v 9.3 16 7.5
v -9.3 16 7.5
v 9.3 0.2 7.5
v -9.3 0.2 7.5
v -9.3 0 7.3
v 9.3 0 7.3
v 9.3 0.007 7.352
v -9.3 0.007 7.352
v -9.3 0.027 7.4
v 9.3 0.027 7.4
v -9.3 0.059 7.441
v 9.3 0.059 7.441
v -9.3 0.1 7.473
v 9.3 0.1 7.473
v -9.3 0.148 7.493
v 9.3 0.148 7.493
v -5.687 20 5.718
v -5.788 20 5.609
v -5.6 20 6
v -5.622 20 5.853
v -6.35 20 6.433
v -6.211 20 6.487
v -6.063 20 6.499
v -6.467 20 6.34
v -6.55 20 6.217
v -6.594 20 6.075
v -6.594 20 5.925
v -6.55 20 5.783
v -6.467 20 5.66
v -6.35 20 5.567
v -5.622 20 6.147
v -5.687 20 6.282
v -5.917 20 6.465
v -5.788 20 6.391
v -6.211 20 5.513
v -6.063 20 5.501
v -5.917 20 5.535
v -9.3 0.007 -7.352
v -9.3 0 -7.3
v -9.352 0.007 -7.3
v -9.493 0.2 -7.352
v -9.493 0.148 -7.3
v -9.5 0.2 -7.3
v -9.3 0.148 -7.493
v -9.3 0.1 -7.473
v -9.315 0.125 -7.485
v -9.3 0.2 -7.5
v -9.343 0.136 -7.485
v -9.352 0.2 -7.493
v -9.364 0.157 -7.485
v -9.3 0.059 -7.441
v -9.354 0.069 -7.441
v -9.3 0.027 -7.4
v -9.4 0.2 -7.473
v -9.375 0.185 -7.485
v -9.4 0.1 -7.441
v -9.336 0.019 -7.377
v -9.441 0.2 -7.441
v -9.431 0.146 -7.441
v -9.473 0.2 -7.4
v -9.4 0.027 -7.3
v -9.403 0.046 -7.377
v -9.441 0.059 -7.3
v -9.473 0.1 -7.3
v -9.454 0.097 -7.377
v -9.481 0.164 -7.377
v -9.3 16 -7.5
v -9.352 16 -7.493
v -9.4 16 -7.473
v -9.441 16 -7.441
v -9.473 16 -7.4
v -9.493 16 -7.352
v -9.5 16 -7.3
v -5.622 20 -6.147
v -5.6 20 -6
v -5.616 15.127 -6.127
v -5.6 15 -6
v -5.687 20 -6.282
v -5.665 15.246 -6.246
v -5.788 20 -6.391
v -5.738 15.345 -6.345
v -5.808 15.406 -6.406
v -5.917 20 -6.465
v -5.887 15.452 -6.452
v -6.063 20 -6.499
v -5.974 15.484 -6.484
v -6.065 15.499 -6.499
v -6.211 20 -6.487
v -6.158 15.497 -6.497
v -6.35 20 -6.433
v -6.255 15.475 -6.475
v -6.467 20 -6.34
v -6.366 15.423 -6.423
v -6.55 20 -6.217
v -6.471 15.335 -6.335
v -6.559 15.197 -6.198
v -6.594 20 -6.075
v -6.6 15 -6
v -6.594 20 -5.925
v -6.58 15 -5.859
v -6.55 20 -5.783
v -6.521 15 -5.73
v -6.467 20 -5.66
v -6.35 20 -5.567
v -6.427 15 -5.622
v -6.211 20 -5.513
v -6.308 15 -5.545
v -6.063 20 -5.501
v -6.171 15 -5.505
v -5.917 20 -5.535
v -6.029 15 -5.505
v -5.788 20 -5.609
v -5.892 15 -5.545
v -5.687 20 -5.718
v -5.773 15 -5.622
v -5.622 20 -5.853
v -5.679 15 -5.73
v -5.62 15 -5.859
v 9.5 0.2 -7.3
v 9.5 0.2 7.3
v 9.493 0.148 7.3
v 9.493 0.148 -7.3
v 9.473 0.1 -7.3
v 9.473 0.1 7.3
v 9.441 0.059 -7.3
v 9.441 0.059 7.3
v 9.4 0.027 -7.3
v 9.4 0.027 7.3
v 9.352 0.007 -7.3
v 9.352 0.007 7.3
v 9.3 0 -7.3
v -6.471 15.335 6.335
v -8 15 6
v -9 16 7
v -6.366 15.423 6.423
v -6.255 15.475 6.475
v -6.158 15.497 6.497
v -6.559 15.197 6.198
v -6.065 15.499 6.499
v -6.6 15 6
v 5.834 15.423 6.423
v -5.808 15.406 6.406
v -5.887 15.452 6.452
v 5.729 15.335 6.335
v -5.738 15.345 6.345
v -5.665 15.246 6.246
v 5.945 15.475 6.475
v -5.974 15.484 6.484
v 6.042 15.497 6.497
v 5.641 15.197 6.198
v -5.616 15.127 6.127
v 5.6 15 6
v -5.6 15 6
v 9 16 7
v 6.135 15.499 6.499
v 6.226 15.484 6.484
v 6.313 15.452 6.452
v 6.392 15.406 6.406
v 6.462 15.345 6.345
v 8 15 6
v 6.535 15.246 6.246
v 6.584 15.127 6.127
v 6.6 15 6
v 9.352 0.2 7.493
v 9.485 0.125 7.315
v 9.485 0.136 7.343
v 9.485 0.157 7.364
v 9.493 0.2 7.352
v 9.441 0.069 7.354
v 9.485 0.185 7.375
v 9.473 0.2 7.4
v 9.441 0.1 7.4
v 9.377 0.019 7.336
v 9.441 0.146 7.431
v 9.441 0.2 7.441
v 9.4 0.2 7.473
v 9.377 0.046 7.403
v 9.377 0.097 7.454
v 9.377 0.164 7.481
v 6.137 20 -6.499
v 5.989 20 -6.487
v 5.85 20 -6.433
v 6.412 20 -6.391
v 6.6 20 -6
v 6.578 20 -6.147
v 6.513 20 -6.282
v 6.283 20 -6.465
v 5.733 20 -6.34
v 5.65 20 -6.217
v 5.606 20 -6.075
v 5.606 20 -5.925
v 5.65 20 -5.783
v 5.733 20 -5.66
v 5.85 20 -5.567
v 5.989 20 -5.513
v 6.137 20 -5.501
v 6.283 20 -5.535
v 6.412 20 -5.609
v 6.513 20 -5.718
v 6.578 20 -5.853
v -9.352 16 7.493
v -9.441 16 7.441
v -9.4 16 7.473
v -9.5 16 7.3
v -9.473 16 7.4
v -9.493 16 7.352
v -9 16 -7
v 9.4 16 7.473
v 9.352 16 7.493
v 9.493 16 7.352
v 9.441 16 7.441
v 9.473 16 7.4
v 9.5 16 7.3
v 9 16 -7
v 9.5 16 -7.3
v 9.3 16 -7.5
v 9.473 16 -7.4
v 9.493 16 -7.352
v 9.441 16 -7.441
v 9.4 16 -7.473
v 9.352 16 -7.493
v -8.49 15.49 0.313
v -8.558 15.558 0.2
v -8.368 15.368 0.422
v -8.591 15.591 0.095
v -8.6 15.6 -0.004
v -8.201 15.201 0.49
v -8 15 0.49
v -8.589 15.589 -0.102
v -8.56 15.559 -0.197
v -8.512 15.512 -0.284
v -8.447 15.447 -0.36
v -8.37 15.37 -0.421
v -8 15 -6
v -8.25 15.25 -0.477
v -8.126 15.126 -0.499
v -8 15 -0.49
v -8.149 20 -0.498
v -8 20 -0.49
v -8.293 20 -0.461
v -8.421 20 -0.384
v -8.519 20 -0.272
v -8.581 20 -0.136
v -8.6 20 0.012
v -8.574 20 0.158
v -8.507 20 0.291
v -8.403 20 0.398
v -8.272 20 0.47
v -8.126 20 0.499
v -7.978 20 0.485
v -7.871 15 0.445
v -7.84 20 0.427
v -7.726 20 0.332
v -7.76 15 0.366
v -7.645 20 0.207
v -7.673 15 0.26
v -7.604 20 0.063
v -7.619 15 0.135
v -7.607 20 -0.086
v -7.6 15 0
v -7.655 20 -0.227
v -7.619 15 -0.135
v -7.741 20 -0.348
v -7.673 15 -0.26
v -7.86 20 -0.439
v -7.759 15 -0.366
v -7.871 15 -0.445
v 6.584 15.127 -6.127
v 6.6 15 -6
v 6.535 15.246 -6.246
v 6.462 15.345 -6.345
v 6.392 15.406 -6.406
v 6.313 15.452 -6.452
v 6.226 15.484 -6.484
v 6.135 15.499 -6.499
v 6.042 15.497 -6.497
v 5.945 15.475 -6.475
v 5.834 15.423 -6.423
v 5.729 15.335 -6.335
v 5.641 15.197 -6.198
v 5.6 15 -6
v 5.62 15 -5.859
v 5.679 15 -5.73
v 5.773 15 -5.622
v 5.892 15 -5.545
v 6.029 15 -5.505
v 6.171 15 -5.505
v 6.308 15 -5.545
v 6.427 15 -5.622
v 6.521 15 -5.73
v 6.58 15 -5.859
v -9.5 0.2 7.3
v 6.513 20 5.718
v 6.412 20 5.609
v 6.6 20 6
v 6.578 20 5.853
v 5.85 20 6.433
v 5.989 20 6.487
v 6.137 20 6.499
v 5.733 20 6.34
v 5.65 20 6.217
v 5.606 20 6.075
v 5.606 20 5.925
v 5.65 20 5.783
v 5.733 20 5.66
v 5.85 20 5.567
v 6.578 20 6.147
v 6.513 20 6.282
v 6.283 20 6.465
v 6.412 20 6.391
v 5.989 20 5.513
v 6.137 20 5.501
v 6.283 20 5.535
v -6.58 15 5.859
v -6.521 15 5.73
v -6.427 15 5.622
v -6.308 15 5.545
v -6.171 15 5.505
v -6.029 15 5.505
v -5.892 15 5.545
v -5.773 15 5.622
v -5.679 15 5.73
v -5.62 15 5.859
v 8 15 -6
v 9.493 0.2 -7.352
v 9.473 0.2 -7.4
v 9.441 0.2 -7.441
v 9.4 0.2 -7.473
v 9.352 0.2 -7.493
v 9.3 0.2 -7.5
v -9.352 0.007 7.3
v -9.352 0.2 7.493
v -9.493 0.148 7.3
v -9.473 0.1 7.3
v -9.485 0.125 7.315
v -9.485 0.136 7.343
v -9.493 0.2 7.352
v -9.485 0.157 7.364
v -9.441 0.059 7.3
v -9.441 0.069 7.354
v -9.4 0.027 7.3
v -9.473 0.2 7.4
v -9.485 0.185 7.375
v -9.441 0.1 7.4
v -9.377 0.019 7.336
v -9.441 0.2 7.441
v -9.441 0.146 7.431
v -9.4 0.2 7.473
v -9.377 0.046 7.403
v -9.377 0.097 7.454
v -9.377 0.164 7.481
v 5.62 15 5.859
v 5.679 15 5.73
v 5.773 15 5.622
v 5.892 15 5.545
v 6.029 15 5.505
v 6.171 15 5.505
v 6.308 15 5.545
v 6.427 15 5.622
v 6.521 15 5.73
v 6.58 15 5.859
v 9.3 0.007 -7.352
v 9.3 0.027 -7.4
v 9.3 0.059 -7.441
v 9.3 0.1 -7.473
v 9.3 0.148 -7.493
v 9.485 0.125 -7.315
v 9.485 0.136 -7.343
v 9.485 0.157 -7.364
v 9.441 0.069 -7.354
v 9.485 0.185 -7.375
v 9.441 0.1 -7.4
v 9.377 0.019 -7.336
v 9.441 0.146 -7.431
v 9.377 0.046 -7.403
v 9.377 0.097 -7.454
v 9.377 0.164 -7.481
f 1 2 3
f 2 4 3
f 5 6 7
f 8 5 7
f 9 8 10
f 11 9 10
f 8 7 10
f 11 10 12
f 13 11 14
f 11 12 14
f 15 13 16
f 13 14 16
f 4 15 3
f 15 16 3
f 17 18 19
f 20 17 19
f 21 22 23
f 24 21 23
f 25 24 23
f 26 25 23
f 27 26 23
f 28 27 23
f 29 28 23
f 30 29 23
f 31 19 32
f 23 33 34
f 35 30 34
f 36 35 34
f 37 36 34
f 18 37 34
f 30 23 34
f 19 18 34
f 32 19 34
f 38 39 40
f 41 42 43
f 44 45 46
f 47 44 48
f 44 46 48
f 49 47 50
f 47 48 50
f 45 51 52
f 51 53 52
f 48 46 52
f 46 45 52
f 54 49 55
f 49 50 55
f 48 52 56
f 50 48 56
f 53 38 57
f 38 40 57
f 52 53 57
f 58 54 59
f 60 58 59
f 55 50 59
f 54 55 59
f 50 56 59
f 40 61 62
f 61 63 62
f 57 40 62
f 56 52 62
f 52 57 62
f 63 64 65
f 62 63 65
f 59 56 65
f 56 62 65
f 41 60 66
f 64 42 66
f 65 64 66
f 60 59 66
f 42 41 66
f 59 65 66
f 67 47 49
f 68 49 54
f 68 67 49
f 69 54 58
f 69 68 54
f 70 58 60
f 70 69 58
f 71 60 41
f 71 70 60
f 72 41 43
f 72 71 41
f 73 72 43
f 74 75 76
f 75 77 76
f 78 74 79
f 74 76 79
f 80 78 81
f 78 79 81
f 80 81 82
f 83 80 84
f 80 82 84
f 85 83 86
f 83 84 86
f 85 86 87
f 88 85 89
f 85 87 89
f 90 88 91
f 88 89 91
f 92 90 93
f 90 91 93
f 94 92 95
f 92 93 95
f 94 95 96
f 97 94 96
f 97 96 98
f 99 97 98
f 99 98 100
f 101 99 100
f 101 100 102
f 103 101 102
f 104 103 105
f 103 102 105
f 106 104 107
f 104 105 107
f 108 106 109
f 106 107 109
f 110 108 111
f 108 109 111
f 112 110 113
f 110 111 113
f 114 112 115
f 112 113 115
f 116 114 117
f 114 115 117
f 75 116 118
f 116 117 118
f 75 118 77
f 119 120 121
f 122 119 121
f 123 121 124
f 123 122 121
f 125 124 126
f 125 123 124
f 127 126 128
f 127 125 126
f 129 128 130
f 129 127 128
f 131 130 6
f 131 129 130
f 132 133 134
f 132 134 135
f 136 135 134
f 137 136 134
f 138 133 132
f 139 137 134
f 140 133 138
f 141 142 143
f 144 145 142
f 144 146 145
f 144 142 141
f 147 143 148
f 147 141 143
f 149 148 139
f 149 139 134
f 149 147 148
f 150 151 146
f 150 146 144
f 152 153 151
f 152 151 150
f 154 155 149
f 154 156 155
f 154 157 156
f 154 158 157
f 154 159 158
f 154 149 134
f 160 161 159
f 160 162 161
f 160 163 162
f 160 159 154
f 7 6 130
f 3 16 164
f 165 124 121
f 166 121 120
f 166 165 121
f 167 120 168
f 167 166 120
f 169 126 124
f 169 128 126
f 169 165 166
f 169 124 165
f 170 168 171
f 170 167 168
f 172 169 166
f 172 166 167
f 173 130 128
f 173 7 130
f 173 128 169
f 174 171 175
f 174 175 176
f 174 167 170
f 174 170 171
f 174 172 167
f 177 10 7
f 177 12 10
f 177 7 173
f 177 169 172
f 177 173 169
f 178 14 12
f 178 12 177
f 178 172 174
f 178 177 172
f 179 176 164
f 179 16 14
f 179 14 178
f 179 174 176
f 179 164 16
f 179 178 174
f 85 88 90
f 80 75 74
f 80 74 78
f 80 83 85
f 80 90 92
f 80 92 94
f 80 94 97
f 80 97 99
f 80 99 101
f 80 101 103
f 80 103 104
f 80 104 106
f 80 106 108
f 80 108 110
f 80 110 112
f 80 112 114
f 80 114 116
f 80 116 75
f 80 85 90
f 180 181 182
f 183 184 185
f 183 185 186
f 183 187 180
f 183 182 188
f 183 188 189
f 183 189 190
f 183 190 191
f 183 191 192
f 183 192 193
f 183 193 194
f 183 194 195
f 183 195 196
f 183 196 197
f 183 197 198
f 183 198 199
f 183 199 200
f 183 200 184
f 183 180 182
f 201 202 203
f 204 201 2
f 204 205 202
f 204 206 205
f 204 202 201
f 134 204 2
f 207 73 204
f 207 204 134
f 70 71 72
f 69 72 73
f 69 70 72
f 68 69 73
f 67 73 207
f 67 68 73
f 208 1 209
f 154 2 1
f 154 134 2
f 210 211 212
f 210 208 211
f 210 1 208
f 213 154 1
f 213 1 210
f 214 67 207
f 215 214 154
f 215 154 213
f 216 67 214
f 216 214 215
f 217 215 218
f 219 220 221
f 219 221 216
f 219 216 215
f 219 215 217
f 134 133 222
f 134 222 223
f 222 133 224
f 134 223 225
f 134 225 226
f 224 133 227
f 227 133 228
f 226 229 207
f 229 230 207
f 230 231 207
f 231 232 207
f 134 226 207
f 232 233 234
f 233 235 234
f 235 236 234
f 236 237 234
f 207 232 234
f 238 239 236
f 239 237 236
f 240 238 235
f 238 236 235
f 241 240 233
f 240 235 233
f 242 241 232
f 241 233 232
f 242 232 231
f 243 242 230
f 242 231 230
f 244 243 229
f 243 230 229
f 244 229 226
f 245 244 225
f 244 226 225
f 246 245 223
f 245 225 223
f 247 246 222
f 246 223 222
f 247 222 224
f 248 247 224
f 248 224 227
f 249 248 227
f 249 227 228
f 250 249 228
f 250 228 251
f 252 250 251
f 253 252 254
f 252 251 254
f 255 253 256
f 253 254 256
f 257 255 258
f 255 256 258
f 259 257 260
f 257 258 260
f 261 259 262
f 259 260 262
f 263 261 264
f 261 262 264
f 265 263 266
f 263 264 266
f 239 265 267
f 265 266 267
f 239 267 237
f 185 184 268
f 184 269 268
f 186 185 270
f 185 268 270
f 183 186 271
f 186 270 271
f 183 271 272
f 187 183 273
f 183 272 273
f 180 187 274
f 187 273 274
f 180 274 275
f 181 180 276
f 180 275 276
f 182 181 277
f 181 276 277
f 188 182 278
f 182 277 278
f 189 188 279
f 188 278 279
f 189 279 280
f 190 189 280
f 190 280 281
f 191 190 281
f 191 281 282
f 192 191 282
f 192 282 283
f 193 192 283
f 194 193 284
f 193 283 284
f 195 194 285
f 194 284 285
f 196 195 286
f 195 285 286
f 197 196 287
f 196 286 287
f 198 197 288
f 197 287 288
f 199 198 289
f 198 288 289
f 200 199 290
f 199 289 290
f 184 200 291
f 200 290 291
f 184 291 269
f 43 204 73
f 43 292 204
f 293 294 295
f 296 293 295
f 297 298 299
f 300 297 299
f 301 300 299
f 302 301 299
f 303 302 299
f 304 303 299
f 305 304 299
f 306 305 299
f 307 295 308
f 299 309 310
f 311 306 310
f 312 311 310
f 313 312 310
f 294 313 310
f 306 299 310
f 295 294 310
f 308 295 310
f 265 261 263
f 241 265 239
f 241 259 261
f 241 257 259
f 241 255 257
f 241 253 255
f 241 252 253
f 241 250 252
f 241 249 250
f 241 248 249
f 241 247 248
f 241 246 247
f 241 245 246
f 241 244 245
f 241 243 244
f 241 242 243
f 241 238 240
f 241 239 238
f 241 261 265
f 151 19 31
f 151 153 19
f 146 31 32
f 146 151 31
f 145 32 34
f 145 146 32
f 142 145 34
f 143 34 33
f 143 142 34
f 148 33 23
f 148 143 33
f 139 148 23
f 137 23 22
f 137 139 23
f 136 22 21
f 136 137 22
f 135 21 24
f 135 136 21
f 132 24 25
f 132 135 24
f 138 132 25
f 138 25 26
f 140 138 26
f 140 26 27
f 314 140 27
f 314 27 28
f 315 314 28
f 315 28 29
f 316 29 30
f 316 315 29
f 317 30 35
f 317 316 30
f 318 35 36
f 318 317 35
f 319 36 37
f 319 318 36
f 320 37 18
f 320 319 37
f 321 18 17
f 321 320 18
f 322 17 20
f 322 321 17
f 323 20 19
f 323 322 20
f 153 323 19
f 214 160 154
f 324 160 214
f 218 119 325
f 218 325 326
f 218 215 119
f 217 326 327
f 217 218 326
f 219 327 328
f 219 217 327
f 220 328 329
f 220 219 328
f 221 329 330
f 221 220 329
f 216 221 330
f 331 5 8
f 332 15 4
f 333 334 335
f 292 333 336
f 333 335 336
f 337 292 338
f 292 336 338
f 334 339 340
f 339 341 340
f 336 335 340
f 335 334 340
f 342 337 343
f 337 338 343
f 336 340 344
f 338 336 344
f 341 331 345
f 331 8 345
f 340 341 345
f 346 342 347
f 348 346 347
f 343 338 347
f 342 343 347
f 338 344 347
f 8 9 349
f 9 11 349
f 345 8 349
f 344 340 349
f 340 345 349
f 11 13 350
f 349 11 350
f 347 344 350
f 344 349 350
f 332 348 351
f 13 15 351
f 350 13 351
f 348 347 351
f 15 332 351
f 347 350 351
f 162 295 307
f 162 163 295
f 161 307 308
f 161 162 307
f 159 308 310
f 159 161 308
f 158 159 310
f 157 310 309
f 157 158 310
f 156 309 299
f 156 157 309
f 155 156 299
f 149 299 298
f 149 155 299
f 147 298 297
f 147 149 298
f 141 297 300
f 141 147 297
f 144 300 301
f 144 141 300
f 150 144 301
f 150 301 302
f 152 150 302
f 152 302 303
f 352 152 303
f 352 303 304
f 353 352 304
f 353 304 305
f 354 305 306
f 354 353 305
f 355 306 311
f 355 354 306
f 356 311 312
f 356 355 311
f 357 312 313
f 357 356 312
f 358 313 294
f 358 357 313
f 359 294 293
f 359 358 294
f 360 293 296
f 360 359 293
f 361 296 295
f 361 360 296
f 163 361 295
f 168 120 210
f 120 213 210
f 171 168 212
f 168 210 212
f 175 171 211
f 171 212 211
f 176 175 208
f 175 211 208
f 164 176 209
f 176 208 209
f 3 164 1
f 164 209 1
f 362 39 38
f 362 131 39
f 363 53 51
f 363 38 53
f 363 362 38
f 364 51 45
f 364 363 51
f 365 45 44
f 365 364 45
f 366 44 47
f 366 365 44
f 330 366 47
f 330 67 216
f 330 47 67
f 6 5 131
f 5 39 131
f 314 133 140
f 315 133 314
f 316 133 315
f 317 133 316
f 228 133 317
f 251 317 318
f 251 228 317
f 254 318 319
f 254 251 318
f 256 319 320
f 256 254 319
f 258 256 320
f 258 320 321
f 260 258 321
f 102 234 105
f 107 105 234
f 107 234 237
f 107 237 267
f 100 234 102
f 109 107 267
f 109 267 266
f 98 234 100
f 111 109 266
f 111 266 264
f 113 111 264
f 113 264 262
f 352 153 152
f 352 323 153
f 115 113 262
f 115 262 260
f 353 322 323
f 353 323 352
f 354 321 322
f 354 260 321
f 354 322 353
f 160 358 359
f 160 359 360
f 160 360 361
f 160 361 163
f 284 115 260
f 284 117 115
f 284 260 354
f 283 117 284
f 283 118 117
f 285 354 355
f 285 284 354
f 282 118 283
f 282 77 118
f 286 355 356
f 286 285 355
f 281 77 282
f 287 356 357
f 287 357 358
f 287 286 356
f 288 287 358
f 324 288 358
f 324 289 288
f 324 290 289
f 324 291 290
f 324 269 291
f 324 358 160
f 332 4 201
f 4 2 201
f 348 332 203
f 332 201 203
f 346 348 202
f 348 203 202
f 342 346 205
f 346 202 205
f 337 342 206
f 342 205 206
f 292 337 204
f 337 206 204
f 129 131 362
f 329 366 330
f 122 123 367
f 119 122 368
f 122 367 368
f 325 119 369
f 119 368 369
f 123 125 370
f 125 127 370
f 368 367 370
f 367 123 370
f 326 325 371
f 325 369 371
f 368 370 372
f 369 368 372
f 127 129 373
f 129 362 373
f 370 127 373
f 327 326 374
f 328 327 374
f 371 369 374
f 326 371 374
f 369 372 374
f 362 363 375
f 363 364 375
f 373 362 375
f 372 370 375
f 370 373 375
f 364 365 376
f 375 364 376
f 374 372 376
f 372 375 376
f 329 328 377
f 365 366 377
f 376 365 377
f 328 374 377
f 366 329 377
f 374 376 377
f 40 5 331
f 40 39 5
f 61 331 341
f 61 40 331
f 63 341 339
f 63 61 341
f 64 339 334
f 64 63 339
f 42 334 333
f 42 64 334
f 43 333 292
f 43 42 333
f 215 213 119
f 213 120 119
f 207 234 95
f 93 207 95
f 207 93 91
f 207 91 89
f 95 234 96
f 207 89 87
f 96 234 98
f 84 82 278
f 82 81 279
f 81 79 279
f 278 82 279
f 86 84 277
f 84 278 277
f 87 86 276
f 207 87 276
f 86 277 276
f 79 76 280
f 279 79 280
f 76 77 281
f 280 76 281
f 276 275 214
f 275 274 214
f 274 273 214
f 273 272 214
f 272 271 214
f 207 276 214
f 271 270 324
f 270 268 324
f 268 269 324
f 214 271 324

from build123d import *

# Parameters (mm, degrees)
SKETCH2_W           = 19
SKETCH2_H           = 15
BOSS_EXTRUDE1_DEPTH = 16
SKETCH3_W           = 18
SKETCH3_H           = 14
CUT_EXTRUDE1_DEPTH  = 1
CHAMFER1_SIZE       = 1
SKETCH4_R           = 0.5
BOSS_EXTRUDE3_DEPTH = 5
FILLET1_R           = 0.2


with BuildPart() as part:
    # Sketch2 → Boss-Extrude1 (new body)
    with BuildSketch(Plane(origin=(0, 0, 0), x_dir=(1, 0, 0), z_dir=(0, 1, 0))):
        Rectangle(SKETCH2_W, SKETCH2_H)
    extrude(amount=BOSS_EXTRUDE1_DEPTH)

    # Sketch3 → Cut-Extrude1 (cut)
    with BuildSketch(Plane(origin=(0, 16, 0), x_dir=(1, 0, 0), z_dir=(0, 1, 0))):
        Rectangle(SKETCH3_W, SKETCH3_H)
    extrude(amount=-CUT_EXTRUDE1_DEPTH, mode=Mode.SUBTRACT)

    # Chamfer1
    chamfer1_edges = [part.edges().sort_by_distance(p)[0] for p in [
        (0, 15, 7),
        (9, 15, 0),
        (0, 15, -7),
        (-9, 15, 0),
    ]]
    chamfer(chamfer1_edges, length=CHAMFER1_SIZE - 0.0001)  # a hair under: the kernel refuses the full size

    # Sketch4 → Boss-Extrude3 (add)
    with BuildSketch(Plane(origin=(0, 15, 0), x_dir=(1, 0, 0), z_dir=(0, 1, 0))):
        with Locations(Location((-8.1, 0, 0), (0, 0, 78.463040967))):
            Circle(SKETCH4_R)
        with Locations((-6.1, 6)):
            Circle(SKETCH4_R)
        with Locations((6.1, 6)):
            Circle(SKETCH4_R)
    boss_extrude3 = extrude(amount=BOSS_EXTRUDE3_DEPTH)

    # Mirror1: Boss-Extrude3 across plane
    add(boss_extrude3.mirror(Plane.XY))

    # Fillet1
    fillet1_edges = [part.edges().sort_by_distance(p)[0] for p in [
        (0, 0, 7.5),
        (-9.5, 0, 0),
        (0, 0, -7.5),
        (9.5, 0, 0),
        (9.5, 8, 7.5),
        (-9.5, 8, 7.5),
        (-9.5, 8, -7.5),
        (9.5, 8, -7.5),
    ]]
    fillet(fillet1_edges, radius=FILLET1_R)


solid = part.part
